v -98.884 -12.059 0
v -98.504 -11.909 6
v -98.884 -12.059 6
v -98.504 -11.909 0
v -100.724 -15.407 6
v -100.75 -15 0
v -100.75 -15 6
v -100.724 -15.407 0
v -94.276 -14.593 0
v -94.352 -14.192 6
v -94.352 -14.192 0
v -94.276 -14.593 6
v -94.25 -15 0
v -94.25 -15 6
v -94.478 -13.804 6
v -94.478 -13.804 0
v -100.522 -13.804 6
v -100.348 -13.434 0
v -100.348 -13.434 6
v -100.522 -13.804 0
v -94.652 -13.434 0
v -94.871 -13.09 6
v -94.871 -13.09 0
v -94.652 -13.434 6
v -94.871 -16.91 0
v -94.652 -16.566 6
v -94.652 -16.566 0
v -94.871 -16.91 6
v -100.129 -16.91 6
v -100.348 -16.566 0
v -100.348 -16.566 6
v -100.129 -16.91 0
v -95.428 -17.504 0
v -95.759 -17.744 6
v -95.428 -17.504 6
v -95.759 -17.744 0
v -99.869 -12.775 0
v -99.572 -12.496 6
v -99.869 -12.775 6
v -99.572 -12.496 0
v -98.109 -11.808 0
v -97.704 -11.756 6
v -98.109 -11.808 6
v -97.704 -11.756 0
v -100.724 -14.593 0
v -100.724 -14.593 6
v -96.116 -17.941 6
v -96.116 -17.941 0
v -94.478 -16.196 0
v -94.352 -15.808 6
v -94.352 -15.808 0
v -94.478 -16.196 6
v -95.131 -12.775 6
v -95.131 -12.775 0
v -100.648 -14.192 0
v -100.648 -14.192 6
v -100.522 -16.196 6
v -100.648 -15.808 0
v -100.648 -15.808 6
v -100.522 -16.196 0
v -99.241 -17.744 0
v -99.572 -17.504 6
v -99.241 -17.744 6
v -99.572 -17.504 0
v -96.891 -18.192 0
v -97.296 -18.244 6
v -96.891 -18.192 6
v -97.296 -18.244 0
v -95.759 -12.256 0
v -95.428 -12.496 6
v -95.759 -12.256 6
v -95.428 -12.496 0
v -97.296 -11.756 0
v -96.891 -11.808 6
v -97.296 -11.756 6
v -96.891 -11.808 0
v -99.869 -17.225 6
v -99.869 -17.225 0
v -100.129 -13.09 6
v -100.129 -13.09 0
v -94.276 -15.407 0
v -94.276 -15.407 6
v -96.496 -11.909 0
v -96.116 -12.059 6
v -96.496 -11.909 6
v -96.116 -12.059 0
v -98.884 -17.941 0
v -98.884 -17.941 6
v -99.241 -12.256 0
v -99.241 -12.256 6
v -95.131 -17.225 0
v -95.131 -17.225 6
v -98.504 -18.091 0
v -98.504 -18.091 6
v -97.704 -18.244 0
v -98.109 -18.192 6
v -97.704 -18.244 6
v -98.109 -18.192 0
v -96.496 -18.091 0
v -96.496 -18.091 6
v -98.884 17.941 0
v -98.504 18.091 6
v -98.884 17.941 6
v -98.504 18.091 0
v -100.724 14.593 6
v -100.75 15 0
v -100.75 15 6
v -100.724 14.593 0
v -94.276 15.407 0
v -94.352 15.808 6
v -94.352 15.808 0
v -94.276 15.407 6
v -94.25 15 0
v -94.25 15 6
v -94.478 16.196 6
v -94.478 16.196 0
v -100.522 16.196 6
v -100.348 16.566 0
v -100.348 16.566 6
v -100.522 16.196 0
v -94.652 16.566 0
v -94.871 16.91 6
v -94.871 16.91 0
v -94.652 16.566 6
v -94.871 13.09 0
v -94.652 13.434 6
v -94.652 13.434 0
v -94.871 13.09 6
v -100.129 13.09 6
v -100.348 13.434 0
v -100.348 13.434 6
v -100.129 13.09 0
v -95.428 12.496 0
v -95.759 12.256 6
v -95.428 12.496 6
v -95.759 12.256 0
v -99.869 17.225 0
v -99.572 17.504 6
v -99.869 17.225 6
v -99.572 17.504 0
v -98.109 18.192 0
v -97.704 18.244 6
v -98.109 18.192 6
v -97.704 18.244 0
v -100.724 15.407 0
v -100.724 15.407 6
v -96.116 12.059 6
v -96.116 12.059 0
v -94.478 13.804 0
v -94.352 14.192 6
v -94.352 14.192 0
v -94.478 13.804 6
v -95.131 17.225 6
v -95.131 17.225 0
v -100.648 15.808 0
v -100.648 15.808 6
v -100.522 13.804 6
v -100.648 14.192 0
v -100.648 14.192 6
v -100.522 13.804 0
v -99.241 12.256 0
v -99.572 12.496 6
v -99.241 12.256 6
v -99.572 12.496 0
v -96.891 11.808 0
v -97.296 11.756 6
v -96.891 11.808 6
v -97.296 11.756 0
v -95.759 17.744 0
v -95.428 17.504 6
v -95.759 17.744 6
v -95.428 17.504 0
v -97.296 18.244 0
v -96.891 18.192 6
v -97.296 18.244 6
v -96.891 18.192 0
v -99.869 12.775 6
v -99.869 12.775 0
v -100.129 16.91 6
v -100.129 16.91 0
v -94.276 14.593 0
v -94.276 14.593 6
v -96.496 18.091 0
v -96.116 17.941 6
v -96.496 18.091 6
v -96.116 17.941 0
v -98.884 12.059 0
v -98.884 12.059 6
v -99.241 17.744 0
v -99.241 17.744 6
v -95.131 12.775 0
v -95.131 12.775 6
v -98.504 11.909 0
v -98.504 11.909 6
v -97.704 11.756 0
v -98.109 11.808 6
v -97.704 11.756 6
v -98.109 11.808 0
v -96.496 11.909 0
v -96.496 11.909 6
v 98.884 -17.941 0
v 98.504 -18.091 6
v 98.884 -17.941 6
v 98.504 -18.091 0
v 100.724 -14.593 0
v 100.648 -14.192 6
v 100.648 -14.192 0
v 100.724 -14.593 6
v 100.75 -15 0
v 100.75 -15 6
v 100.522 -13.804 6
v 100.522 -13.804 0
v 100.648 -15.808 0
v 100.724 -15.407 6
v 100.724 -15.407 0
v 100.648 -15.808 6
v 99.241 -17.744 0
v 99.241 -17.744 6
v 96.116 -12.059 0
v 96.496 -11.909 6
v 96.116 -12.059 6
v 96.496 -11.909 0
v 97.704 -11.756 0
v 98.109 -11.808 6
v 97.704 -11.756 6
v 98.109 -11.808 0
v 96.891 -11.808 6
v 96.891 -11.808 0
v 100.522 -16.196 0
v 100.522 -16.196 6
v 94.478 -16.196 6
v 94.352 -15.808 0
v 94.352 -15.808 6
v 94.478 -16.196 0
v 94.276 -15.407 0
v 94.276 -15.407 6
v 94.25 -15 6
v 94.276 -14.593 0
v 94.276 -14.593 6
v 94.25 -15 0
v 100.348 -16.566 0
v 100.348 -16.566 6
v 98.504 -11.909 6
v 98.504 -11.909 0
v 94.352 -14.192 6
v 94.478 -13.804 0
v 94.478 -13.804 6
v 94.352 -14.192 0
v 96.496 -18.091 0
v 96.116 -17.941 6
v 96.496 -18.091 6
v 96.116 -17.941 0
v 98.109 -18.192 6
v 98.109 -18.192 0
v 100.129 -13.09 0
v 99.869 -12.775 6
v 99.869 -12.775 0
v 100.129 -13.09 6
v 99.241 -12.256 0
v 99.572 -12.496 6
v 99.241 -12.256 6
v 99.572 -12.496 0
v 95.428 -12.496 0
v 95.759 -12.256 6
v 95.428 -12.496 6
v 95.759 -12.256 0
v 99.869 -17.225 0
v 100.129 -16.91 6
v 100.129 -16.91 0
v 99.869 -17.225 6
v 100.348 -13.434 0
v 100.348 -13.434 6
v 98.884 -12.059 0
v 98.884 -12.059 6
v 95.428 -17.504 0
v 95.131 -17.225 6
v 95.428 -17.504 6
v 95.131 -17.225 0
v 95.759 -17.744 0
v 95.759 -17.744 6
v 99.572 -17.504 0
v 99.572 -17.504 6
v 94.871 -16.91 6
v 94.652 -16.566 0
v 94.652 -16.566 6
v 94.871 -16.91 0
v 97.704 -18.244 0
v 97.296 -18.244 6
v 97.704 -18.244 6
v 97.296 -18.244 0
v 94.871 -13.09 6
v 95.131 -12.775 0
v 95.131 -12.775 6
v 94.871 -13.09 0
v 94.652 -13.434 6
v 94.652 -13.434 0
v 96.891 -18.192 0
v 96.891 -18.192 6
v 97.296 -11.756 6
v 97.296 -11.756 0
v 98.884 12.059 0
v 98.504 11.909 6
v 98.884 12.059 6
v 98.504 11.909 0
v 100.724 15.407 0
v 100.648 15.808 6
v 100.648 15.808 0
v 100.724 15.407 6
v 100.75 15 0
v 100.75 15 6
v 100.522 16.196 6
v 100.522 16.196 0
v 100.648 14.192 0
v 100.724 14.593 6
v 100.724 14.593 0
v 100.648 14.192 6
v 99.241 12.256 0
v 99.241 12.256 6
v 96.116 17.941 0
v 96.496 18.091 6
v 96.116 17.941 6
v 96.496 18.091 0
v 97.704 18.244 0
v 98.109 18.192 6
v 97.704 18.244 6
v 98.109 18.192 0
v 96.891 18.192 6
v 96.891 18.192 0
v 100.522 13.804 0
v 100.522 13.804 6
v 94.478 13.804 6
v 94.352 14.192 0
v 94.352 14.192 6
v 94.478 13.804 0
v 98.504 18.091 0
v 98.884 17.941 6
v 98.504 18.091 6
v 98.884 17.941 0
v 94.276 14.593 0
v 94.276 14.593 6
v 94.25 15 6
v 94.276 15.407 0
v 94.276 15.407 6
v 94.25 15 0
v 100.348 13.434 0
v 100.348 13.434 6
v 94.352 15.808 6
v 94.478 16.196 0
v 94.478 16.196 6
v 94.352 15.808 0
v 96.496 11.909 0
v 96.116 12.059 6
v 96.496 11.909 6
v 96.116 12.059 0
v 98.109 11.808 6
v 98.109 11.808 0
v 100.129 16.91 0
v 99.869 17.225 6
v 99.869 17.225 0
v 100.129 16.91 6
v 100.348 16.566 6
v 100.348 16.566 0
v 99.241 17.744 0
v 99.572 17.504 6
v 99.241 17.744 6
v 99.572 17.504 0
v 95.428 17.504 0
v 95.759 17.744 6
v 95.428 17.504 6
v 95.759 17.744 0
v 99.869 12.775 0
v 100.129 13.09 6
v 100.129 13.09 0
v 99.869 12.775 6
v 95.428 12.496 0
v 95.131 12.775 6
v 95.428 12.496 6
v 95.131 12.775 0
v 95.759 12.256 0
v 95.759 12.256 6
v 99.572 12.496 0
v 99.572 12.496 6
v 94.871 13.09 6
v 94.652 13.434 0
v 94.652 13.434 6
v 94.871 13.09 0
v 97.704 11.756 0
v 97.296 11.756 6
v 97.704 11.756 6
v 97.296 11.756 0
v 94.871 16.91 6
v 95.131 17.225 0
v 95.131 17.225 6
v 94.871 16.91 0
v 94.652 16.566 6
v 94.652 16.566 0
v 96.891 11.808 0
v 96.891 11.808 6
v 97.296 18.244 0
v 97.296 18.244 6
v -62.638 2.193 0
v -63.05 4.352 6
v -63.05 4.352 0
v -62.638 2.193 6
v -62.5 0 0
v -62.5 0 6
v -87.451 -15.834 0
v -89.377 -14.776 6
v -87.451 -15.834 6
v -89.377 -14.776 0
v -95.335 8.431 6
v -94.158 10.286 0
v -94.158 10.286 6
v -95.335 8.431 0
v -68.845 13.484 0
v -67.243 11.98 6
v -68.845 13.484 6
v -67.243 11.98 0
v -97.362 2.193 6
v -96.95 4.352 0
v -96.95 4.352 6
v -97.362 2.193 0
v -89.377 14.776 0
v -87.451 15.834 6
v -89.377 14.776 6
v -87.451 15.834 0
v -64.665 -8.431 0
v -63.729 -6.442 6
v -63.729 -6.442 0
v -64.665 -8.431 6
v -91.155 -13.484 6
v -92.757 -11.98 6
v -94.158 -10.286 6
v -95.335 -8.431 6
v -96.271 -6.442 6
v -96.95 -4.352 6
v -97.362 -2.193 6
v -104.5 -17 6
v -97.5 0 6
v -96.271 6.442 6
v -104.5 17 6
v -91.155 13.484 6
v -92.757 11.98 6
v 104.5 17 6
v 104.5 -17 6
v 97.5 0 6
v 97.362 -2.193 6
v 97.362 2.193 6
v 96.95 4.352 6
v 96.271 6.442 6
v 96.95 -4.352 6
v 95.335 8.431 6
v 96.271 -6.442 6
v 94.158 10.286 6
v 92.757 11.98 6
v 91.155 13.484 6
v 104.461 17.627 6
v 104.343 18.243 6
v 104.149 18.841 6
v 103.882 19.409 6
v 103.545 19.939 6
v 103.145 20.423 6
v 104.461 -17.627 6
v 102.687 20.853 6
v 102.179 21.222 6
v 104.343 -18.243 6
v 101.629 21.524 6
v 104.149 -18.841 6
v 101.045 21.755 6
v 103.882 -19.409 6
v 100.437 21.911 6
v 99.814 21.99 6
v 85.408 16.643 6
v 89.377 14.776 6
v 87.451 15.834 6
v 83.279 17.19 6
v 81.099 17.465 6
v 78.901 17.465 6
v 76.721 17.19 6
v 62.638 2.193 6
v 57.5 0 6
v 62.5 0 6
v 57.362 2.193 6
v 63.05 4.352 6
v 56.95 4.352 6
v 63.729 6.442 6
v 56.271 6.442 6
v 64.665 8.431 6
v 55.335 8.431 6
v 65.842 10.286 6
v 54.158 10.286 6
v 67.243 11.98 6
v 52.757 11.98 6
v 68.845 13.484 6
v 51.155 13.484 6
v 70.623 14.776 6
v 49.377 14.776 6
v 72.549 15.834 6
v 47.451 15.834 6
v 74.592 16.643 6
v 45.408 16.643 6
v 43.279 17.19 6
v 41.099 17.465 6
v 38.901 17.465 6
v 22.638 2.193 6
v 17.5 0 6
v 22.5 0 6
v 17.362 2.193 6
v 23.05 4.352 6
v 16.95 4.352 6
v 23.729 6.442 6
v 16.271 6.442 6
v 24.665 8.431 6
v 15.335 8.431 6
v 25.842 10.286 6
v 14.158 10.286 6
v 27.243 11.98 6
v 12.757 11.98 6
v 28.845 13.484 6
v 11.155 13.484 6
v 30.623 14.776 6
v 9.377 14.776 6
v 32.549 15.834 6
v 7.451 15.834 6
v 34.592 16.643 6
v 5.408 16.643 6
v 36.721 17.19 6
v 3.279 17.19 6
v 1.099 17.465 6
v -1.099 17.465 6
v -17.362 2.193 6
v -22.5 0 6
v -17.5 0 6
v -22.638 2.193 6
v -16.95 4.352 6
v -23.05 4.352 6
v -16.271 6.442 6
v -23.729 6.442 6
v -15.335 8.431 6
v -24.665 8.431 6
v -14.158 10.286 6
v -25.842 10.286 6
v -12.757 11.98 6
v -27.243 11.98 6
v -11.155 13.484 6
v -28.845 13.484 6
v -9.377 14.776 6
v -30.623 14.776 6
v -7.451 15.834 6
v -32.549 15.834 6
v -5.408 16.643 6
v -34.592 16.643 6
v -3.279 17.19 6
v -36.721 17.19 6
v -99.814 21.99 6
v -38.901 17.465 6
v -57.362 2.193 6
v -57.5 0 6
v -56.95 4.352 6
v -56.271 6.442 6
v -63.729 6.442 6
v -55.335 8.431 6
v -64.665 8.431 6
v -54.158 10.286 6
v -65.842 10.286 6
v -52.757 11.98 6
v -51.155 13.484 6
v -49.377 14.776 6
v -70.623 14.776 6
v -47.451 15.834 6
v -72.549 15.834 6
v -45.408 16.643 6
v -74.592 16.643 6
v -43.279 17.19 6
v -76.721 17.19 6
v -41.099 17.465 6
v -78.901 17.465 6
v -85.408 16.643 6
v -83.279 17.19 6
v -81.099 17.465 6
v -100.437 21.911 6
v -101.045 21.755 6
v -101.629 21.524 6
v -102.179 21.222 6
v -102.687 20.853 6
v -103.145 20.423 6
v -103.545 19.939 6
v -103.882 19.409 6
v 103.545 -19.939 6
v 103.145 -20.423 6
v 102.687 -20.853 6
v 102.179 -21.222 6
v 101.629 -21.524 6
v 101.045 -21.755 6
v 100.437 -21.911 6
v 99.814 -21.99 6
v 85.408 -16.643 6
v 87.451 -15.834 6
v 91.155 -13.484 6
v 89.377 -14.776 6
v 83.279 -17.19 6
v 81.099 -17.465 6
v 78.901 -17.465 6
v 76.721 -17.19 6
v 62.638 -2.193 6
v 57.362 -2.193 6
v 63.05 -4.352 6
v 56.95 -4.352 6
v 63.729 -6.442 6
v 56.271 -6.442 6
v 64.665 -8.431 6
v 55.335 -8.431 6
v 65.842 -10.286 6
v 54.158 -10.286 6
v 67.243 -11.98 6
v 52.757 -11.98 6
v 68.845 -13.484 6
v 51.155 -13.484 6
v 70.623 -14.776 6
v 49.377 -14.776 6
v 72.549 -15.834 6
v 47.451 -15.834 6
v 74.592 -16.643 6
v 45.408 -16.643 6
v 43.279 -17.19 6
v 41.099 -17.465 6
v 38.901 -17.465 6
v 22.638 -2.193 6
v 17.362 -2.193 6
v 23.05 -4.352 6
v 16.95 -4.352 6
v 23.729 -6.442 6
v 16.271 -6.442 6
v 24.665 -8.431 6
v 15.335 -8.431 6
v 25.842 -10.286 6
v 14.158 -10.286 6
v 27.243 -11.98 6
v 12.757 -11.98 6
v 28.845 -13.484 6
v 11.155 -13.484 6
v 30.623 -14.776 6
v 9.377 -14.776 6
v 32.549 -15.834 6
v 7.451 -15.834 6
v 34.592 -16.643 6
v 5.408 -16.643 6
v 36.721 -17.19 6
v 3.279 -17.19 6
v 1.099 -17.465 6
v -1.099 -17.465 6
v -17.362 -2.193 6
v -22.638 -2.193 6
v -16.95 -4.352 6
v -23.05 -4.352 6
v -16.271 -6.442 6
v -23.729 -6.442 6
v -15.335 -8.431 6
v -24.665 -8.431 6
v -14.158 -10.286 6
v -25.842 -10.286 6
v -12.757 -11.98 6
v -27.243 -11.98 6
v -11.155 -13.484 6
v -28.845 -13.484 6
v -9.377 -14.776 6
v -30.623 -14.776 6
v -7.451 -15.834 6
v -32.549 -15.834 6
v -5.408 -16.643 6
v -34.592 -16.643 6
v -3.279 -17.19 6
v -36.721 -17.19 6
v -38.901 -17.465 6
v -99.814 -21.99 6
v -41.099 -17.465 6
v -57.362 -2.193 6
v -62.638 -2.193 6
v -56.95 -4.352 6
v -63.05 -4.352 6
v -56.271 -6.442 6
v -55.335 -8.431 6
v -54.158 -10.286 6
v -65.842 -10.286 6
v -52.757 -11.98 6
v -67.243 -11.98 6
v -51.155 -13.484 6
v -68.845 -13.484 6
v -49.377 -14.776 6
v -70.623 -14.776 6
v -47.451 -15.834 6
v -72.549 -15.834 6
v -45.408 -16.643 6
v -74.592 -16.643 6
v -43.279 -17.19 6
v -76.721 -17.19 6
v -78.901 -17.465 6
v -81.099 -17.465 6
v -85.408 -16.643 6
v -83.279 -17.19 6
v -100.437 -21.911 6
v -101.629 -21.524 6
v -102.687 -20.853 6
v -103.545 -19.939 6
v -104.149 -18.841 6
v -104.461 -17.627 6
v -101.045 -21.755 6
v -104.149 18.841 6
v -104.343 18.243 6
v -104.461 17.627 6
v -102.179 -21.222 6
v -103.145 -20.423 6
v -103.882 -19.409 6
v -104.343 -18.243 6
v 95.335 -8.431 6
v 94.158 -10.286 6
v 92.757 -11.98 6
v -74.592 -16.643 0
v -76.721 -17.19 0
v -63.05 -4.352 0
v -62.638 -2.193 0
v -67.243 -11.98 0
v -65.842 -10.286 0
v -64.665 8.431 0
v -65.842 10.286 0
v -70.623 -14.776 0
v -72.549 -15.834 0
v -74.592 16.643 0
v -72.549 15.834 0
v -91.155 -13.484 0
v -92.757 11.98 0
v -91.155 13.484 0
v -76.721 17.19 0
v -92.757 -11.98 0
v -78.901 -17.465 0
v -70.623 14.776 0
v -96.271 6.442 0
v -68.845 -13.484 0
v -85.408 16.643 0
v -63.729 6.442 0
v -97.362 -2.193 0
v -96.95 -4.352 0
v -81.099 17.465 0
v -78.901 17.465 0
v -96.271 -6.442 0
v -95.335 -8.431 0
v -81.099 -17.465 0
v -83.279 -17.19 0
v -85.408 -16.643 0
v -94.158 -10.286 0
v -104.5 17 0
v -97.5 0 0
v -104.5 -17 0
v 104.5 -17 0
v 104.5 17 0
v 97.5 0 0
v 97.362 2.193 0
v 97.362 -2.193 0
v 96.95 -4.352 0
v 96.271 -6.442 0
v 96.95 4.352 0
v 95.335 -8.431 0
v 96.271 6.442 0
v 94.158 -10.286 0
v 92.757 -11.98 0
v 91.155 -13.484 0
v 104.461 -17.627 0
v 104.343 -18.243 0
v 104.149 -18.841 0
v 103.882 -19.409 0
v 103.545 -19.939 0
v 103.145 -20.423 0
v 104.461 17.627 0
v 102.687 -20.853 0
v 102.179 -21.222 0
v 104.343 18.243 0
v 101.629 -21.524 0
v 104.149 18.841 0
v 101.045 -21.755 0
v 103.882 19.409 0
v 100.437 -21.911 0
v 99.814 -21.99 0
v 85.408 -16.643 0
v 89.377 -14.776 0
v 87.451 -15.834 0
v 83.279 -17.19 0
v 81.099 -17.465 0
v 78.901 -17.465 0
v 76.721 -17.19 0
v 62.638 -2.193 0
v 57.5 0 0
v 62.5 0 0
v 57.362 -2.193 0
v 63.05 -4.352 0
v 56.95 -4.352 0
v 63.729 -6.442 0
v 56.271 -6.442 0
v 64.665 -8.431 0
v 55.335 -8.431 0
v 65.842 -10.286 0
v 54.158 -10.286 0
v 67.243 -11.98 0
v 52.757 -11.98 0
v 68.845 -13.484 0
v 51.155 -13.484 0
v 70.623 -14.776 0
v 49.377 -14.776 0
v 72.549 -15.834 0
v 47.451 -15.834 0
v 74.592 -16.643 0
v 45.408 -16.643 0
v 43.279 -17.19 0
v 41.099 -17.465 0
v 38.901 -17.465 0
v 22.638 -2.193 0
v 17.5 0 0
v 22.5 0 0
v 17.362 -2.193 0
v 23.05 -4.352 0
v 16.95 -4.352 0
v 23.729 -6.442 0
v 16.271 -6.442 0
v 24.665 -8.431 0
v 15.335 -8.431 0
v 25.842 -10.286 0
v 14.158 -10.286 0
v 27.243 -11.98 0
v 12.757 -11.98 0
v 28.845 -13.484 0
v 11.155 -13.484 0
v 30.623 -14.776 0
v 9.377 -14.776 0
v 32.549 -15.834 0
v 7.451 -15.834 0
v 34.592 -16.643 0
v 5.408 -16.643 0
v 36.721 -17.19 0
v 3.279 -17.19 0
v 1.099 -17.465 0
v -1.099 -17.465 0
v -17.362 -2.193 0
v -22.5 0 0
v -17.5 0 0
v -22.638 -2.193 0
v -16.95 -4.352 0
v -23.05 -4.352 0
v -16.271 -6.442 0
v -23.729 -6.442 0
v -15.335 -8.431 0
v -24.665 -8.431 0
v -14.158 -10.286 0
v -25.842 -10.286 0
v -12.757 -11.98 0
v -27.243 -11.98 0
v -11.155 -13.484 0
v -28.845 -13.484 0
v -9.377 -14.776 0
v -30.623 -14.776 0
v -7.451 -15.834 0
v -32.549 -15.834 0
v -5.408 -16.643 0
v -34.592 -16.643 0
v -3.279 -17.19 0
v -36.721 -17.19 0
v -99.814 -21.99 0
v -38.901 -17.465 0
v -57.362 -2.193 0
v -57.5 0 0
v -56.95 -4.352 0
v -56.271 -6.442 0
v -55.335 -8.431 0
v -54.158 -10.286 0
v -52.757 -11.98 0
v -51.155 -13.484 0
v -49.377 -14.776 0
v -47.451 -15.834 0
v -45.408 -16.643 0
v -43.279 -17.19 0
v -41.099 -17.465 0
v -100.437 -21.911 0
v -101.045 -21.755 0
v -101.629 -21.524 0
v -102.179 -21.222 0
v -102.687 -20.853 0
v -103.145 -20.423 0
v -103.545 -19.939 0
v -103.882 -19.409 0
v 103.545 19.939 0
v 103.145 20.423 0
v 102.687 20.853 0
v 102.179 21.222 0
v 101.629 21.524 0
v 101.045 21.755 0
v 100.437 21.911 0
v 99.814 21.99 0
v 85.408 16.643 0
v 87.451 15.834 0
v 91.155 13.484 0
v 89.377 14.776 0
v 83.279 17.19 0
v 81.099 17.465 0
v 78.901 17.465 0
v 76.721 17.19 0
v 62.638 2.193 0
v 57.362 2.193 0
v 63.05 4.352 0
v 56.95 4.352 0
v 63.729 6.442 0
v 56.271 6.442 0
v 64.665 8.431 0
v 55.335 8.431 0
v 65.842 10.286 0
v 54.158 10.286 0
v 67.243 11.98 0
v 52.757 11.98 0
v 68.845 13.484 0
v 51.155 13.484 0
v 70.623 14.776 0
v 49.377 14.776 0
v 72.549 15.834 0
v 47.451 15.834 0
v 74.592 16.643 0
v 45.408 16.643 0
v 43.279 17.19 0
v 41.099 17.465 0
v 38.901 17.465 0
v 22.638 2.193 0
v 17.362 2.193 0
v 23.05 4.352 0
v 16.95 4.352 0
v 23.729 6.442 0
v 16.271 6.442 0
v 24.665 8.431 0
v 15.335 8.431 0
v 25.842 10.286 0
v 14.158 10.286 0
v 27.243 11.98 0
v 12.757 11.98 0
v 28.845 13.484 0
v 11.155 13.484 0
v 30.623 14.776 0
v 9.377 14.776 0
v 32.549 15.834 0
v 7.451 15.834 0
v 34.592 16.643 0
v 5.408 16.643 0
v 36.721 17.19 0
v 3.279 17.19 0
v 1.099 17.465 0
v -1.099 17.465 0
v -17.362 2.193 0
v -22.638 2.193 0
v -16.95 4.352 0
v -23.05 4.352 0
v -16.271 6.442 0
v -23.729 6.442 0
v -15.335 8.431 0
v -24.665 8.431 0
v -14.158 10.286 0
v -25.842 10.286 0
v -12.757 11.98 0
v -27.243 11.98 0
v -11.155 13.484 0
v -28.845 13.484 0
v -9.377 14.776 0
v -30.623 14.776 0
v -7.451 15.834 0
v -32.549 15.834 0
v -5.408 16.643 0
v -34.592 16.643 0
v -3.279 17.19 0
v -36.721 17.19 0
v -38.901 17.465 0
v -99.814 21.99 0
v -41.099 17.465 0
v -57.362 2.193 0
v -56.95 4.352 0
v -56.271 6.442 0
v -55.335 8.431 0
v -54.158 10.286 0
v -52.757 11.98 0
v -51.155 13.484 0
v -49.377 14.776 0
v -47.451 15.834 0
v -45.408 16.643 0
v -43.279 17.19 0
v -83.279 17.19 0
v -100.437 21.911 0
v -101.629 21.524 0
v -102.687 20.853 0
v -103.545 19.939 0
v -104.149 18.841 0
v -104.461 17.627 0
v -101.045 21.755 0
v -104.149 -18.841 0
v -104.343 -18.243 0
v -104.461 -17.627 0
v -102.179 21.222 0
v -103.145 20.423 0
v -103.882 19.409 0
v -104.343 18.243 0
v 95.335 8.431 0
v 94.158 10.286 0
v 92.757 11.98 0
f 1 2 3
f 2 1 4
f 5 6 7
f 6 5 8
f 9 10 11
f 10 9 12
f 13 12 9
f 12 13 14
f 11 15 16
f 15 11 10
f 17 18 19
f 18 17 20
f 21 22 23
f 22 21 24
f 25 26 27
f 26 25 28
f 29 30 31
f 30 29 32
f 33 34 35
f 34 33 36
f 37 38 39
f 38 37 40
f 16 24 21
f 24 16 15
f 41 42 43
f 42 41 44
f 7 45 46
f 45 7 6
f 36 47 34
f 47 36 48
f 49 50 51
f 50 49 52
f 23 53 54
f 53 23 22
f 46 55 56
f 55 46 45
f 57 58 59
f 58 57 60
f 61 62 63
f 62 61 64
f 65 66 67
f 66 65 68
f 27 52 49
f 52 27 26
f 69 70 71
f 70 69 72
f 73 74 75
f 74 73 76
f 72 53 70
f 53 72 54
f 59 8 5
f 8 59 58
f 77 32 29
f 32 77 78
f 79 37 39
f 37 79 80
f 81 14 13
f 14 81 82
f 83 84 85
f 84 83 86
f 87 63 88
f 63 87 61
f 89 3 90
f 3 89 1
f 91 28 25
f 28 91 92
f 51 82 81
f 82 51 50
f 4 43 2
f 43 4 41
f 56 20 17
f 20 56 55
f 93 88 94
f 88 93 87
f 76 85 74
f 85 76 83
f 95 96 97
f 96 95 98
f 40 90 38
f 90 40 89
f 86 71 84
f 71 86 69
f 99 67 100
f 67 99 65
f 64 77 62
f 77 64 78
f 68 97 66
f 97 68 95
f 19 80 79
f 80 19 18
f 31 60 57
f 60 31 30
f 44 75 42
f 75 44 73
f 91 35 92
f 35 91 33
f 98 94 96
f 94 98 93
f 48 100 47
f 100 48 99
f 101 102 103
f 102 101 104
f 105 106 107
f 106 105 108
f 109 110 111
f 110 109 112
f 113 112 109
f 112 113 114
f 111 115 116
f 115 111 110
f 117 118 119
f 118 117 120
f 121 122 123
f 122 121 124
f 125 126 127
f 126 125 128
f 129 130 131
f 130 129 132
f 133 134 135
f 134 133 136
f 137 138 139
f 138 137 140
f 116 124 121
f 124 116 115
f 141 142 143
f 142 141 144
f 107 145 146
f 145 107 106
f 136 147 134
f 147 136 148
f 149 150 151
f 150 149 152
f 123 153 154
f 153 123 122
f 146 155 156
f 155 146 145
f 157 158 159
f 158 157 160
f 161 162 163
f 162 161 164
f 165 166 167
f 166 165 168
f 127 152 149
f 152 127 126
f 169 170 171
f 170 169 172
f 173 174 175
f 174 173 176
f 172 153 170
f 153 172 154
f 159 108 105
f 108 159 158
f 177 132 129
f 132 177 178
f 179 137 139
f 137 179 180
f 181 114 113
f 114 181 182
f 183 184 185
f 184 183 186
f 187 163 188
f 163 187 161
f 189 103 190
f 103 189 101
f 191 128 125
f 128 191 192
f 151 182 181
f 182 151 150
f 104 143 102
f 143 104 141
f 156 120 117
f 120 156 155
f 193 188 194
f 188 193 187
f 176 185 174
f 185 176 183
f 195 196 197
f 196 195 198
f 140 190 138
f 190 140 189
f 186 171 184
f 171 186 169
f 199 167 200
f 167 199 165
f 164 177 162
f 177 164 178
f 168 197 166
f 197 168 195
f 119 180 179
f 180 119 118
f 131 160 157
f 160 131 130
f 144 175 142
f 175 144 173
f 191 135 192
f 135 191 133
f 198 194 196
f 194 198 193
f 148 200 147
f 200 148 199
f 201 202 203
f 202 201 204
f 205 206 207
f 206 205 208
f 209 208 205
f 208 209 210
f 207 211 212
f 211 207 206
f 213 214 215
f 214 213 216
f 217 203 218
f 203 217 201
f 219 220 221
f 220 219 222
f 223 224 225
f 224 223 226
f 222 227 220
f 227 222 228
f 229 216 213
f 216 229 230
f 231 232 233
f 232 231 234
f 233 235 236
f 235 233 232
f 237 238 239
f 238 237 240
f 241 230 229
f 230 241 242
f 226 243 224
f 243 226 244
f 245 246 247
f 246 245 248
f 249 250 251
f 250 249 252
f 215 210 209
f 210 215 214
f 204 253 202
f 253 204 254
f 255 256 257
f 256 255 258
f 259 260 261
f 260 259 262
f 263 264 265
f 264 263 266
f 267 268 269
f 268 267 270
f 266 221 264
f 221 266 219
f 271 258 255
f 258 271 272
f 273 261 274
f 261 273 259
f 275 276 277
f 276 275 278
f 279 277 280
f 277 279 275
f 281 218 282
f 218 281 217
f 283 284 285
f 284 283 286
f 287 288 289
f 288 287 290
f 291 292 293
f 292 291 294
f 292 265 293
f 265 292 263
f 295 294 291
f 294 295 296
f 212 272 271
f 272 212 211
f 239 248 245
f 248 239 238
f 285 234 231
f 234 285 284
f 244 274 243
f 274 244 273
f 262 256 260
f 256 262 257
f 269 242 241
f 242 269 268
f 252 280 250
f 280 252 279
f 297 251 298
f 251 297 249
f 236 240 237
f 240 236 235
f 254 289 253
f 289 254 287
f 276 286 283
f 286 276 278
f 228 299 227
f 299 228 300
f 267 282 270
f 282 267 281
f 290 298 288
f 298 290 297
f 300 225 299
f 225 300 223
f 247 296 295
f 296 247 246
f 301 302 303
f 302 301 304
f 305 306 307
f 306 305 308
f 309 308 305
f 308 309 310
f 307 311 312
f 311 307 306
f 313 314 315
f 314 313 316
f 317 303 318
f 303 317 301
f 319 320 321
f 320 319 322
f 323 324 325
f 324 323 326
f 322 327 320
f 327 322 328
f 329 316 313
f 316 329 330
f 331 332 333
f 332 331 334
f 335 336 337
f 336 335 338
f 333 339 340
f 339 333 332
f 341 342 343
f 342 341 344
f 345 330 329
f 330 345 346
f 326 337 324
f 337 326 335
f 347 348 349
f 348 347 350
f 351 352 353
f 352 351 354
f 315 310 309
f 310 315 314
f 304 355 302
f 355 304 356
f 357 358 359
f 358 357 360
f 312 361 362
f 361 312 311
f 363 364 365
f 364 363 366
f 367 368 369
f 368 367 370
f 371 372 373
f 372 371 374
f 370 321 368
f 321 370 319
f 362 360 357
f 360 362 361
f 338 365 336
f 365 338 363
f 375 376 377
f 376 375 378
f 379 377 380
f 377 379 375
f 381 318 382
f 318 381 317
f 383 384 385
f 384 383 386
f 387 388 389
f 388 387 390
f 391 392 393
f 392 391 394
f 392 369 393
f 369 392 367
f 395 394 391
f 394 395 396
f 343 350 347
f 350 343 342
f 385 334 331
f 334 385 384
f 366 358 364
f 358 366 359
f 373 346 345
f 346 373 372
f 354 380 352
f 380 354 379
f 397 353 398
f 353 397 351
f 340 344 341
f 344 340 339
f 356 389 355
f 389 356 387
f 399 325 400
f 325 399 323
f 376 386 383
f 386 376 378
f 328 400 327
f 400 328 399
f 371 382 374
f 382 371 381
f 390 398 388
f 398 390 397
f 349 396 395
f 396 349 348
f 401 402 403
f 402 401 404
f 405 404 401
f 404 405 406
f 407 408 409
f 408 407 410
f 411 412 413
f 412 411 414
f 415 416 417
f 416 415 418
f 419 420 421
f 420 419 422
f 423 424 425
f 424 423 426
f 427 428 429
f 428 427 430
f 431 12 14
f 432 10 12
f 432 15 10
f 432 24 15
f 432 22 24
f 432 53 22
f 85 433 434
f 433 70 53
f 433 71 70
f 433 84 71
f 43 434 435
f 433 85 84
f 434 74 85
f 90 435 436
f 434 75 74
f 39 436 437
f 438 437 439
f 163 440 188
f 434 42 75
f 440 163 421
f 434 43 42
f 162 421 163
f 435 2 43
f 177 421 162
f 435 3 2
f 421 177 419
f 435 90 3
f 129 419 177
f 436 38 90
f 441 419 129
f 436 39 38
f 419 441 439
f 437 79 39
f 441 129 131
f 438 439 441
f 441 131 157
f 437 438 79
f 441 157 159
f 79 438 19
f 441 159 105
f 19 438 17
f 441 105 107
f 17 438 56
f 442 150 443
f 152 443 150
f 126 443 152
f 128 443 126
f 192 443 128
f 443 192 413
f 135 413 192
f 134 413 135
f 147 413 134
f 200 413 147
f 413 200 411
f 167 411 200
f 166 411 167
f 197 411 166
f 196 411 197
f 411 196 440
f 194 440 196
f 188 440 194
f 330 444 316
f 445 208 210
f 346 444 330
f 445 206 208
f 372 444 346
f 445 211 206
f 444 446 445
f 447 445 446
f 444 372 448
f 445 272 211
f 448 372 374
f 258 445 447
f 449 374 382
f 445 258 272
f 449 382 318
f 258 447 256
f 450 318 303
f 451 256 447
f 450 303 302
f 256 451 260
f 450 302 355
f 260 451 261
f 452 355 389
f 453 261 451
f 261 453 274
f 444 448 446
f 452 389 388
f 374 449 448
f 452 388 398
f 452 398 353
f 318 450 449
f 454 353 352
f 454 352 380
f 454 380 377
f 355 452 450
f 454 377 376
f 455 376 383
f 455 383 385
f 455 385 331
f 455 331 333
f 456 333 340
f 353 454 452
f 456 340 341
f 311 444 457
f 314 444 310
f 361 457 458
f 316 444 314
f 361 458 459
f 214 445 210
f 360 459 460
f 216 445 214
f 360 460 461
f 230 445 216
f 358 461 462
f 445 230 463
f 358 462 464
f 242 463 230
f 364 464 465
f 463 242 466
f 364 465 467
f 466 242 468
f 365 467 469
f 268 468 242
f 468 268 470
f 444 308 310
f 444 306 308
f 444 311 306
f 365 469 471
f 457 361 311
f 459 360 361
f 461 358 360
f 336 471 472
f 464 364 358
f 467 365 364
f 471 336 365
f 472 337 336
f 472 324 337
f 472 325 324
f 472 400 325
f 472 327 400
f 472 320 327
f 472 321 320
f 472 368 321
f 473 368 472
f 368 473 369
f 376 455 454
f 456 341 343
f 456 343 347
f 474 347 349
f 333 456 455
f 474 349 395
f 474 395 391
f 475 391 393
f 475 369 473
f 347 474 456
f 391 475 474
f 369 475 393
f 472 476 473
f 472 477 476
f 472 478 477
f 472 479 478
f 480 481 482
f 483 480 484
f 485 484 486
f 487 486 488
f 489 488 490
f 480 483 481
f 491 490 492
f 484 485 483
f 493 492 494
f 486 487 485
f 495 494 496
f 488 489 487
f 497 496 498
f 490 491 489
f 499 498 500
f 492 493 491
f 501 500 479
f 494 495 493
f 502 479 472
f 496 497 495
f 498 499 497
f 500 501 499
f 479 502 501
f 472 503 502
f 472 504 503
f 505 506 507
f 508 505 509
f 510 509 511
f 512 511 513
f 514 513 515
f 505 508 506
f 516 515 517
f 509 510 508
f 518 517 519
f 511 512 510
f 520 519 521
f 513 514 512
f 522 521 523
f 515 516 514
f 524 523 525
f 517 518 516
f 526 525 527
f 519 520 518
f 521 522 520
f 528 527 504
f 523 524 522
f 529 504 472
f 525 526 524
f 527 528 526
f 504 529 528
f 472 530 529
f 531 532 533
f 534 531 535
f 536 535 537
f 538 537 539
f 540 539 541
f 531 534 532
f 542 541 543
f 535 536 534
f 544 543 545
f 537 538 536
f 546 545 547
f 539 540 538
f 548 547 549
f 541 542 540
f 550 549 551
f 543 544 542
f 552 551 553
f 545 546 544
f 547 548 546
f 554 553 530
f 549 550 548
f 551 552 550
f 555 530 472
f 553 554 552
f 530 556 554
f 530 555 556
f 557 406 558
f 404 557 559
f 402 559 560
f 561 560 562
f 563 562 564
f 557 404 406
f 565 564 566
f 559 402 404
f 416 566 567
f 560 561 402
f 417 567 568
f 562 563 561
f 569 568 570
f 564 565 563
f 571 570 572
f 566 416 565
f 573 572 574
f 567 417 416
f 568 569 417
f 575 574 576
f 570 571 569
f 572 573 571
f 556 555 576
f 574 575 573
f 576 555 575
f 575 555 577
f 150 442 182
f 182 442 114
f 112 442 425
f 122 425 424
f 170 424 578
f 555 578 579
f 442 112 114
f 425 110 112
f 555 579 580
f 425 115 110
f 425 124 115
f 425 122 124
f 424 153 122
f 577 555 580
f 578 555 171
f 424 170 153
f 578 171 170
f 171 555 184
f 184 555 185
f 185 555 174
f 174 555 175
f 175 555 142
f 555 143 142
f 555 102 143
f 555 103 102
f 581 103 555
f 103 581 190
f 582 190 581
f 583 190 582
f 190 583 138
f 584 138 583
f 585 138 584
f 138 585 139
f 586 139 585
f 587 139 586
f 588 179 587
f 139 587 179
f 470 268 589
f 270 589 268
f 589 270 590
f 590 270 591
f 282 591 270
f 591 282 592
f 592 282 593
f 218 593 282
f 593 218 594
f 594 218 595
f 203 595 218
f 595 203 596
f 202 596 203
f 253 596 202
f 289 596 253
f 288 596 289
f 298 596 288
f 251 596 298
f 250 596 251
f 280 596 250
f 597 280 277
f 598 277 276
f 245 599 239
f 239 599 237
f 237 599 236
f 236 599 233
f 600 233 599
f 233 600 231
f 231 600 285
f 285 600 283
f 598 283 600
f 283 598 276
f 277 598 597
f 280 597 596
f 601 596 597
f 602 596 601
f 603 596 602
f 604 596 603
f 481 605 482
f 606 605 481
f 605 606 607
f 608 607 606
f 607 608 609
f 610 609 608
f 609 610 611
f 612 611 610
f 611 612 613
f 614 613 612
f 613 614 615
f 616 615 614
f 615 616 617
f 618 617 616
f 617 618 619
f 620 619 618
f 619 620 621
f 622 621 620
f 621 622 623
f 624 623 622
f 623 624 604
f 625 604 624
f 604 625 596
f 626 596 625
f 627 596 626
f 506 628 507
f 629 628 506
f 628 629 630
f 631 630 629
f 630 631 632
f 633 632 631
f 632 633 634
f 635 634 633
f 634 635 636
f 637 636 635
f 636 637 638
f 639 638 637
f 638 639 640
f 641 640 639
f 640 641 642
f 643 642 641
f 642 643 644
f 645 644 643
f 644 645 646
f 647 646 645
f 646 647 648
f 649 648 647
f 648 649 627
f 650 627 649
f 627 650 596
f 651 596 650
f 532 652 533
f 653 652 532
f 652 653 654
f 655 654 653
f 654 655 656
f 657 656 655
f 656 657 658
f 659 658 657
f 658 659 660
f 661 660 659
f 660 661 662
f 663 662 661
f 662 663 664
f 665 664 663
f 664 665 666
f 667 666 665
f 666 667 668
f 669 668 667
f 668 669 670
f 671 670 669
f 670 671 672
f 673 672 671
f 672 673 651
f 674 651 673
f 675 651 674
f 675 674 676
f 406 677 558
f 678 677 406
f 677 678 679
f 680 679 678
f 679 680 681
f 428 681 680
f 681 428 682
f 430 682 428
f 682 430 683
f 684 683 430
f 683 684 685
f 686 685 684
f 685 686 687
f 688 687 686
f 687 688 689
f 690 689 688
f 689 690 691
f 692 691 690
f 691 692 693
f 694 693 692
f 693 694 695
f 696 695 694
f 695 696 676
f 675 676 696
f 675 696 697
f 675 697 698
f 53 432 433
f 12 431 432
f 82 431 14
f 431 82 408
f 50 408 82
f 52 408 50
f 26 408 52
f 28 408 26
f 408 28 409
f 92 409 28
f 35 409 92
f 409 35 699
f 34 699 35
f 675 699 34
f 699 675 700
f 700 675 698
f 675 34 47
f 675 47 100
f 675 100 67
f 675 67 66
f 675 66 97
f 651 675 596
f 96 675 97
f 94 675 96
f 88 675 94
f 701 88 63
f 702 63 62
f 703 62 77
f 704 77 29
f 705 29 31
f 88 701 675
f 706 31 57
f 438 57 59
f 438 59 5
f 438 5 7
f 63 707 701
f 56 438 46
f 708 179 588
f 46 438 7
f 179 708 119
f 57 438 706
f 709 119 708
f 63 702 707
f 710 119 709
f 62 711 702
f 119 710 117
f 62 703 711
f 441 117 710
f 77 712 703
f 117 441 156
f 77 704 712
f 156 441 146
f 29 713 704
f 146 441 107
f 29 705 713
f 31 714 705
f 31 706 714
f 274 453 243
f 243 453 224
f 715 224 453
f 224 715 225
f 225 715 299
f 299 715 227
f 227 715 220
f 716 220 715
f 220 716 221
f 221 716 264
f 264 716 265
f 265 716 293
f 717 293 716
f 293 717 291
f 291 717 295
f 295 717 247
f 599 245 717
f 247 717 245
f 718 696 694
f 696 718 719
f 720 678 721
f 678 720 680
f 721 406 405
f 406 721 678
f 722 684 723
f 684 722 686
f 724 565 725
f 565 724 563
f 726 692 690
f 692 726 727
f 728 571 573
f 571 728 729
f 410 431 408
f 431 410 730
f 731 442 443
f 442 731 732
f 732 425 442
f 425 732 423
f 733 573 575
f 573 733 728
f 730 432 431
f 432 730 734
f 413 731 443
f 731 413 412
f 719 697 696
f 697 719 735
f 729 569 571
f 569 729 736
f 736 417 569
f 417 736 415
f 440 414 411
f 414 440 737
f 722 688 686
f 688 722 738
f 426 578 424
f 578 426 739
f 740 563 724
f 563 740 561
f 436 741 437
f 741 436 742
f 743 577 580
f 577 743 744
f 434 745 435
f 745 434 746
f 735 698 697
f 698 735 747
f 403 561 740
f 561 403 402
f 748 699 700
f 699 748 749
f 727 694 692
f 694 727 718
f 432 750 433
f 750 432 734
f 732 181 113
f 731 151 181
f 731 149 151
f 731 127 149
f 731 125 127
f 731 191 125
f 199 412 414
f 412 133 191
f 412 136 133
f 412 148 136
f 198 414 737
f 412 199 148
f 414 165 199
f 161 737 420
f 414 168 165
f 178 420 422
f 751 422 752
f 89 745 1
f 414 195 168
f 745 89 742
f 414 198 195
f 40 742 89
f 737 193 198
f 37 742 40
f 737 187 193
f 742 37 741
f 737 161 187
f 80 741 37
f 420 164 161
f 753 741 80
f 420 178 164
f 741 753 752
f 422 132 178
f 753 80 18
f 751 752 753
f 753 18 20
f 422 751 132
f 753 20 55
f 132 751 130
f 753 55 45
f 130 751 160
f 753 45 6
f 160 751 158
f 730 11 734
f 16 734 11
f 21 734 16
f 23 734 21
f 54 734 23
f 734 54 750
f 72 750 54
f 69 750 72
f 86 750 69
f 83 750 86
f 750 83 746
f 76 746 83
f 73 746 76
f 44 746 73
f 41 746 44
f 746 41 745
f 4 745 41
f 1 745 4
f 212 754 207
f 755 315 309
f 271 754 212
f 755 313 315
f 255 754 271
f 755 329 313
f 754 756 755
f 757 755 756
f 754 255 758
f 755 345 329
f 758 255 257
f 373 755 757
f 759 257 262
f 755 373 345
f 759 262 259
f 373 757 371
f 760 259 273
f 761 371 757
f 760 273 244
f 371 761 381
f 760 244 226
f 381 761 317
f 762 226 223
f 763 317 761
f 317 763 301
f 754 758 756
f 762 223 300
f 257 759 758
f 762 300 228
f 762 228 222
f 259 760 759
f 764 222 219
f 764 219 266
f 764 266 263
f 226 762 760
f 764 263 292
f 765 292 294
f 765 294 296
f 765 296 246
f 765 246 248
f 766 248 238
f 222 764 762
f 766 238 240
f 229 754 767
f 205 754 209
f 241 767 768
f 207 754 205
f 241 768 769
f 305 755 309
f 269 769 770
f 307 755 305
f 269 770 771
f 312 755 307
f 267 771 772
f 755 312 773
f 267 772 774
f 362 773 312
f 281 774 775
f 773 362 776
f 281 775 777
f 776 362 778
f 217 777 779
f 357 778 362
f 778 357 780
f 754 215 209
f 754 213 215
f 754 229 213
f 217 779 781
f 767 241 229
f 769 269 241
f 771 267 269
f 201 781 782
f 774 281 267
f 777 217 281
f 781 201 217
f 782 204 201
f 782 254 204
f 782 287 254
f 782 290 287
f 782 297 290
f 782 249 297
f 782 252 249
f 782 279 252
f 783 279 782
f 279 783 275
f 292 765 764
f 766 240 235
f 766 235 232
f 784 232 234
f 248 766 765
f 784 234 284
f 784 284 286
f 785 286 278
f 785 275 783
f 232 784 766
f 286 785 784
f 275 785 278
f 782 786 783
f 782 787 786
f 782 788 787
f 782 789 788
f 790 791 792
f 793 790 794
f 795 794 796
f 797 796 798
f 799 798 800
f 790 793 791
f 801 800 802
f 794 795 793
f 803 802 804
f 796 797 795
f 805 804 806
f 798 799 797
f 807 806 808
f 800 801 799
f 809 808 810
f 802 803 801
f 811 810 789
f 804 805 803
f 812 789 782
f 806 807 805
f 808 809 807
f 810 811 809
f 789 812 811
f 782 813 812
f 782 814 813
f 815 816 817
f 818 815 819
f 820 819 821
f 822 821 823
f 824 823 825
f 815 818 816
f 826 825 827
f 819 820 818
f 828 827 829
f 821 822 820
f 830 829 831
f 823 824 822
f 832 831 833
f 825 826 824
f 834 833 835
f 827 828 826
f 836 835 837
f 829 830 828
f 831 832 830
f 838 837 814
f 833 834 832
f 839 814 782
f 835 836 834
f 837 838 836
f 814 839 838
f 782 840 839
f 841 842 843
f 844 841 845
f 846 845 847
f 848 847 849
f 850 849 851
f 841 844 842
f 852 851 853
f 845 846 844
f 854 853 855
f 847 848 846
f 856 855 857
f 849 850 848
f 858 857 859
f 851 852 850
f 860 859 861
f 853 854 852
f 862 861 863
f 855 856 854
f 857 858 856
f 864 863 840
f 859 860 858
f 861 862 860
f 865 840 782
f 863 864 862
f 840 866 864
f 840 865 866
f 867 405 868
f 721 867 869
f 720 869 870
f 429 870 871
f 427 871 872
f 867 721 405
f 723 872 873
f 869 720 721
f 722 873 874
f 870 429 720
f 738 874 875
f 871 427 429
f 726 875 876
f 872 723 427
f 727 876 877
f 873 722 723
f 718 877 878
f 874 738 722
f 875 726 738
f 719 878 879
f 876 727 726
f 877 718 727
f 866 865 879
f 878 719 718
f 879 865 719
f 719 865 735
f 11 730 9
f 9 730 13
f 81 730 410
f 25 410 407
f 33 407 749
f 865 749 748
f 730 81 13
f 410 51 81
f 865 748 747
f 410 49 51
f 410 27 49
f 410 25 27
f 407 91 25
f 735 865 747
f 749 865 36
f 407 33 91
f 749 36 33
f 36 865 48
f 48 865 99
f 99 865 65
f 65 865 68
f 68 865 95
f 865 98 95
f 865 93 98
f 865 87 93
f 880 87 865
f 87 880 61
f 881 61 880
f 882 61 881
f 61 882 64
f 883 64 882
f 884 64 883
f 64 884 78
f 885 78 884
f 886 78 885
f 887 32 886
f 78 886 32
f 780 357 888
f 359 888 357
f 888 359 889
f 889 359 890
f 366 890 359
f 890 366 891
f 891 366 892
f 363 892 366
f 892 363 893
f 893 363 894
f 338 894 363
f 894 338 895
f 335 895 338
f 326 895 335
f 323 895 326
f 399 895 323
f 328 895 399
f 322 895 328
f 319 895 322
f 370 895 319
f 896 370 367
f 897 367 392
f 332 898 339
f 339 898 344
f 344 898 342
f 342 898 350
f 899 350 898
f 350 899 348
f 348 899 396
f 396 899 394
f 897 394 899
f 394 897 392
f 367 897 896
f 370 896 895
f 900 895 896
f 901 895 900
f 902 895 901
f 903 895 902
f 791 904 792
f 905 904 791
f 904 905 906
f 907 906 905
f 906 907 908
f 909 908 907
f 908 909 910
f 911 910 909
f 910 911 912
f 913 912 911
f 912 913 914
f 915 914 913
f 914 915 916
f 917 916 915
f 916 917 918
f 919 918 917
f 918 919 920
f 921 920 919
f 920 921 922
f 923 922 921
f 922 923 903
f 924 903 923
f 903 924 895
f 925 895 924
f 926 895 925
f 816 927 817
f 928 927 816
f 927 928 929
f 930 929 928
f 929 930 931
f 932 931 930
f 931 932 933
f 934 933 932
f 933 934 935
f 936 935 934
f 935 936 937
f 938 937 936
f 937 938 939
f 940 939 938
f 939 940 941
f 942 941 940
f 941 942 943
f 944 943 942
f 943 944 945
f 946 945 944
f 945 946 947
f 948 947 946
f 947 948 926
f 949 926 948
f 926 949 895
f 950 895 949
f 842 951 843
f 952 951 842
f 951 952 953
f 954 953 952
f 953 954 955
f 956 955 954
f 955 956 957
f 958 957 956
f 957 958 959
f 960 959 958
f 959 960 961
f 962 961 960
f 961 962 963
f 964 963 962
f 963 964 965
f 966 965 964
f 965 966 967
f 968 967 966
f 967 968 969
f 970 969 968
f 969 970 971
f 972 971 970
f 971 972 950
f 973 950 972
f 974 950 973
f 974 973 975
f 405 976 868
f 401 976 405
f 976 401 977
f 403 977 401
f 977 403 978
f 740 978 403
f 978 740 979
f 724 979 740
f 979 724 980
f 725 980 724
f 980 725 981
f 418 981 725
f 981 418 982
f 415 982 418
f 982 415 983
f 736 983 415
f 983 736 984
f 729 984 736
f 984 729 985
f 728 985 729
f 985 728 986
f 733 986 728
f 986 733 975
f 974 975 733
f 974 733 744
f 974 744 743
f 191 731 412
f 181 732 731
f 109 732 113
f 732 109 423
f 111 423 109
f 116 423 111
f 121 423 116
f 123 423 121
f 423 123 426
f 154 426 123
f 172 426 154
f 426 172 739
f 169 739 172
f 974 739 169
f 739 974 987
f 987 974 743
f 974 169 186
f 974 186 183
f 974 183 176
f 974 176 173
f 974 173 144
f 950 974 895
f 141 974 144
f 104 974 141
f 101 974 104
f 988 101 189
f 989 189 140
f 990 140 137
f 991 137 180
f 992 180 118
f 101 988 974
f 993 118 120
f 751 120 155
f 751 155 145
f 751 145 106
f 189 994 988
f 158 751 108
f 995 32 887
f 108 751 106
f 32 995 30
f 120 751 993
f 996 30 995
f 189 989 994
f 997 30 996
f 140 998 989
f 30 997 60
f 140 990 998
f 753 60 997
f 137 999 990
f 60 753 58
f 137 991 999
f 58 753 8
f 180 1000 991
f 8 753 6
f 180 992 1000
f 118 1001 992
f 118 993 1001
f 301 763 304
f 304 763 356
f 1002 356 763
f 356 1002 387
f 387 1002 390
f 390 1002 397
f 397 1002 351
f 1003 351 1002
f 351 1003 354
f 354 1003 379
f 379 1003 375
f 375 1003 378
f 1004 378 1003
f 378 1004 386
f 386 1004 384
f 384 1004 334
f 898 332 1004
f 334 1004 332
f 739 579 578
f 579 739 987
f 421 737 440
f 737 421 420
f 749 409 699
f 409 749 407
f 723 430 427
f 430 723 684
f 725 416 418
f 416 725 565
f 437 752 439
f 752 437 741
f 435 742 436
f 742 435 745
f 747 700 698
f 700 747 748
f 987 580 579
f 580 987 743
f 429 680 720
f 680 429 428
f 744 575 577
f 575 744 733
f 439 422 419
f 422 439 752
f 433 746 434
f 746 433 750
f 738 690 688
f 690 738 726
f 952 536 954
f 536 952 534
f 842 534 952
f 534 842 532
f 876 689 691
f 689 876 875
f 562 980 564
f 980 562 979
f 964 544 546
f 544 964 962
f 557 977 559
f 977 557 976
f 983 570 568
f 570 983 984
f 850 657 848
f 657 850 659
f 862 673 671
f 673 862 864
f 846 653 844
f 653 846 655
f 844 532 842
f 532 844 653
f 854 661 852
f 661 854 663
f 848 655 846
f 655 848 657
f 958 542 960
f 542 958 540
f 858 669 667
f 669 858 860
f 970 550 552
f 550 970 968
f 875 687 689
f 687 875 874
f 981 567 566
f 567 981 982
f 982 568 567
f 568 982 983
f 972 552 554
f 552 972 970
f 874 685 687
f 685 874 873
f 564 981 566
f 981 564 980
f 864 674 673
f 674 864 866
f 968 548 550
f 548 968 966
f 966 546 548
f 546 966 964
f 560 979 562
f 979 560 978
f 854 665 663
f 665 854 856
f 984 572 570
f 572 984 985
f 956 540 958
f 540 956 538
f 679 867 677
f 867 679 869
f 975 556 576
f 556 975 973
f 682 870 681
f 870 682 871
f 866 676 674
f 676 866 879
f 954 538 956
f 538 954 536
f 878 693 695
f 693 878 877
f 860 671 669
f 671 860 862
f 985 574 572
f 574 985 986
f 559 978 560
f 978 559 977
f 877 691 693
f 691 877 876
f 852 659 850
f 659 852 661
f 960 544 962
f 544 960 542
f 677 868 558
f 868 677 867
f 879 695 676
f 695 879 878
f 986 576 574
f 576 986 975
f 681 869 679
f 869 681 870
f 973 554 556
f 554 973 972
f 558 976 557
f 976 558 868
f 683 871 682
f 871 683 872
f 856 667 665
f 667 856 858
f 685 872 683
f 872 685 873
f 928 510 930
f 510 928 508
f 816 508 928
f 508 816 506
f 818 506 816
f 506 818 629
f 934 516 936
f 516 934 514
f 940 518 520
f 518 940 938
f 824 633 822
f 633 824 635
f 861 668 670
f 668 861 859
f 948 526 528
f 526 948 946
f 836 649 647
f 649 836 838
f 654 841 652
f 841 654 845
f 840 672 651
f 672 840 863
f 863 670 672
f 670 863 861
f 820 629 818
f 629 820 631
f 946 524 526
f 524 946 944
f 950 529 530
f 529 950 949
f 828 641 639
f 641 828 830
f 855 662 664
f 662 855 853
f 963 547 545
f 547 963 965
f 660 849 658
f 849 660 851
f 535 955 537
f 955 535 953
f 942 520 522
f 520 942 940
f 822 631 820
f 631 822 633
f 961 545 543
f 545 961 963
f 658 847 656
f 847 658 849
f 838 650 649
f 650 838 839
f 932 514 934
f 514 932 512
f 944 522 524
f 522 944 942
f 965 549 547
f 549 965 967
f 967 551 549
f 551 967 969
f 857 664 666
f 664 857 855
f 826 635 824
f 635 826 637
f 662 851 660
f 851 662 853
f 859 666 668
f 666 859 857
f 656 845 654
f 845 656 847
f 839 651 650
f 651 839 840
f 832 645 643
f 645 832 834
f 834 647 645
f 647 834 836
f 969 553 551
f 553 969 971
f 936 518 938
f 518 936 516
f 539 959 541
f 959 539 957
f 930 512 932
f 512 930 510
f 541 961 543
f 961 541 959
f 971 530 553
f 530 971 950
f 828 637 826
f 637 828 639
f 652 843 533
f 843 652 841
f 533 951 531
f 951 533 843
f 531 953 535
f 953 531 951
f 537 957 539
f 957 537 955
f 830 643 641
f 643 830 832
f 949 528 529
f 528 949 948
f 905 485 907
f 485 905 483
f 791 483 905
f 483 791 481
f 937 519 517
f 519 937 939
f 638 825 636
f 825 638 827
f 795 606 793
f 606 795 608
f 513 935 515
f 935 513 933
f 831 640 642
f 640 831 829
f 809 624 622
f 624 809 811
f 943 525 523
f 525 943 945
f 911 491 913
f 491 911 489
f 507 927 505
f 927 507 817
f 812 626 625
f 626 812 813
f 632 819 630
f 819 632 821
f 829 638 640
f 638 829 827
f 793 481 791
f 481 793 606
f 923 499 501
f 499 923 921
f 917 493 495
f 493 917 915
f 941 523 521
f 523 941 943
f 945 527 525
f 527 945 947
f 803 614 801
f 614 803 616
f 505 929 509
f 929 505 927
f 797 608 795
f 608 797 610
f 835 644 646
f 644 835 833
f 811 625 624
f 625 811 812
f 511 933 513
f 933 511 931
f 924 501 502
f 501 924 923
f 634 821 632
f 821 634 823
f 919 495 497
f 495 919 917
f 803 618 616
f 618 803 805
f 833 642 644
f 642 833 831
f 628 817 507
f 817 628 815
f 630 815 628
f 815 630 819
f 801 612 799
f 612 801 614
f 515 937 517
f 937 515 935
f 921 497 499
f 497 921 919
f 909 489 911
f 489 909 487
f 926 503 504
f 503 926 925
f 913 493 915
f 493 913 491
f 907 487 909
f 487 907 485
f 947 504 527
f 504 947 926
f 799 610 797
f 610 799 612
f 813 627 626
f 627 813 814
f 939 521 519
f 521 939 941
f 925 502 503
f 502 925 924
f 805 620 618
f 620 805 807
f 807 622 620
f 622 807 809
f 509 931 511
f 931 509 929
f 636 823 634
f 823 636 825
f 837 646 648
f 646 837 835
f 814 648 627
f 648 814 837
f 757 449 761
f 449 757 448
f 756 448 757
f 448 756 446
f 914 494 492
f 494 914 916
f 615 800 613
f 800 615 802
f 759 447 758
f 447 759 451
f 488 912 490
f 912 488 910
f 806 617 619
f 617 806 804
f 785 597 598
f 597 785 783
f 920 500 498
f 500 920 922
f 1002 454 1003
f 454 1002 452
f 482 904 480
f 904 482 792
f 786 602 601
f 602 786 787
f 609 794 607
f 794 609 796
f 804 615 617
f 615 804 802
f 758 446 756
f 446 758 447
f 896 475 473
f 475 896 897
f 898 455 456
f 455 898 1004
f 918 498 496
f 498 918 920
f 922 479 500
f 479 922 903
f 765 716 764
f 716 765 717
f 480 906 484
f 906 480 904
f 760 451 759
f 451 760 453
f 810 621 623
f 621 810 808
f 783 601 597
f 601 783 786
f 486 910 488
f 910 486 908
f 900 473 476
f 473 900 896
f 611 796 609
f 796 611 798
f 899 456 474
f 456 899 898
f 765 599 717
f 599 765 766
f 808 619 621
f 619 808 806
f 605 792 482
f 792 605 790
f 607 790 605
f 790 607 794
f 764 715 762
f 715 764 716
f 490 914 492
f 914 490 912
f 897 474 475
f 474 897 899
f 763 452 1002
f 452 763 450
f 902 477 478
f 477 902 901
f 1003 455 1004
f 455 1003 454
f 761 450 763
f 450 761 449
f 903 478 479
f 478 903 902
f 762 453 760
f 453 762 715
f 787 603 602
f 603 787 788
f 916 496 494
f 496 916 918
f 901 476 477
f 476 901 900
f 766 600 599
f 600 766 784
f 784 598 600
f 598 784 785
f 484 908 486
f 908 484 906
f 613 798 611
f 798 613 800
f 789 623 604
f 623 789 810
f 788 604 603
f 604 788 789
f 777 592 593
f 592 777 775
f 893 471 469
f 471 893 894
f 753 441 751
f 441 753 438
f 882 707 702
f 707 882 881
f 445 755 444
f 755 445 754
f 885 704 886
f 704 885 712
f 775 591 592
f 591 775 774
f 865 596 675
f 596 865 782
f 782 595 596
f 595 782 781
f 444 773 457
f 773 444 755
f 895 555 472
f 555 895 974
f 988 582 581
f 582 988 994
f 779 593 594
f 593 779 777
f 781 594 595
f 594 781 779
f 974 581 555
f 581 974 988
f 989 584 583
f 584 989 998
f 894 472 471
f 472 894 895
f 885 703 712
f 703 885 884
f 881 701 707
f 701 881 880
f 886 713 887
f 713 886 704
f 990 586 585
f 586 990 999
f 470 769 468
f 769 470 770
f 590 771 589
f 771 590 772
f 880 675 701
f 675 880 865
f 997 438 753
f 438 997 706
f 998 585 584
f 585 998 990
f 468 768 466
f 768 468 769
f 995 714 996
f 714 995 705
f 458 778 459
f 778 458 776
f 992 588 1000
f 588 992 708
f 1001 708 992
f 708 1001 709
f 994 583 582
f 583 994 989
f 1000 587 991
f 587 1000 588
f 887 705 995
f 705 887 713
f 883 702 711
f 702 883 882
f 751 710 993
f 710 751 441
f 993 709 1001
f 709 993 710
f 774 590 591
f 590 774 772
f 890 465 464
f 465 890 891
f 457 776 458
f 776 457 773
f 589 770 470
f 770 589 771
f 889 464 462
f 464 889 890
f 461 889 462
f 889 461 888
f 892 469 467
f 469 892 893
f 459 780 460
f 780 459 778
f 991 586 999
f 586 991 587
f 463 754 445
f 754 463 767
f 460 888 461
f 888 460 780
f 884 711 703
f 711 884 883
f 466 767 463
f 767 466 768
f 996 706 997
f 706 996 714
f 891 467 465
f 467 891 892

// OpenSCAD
$fn = 50;


difference() {
	union() {
		hull() {
			translate(v = [-99.5000000000, 17.0000000000, 0]) {
				cylinder(h = 6, r = 5);
			}
			translate(v = [99.5000000000, 17.0000000000, 0]) {
				cylinder(h = 6, r = 5);
			}
			translate(v = [-99.5000000000, -17.0000000000, 0]) {
				cylinder(h = 6, r = 5);
			}
			translate(v = [99.5000000000, -17.0000000000, 0]) {
				cylinder(h = 6, r = 5);
			}
		}
	}
	union() {
		#translate(v = [-97.5000000000, -15.0000000000, -100.0000000000]) {
			cylinder(h = 200, r = 3.2500000000);
		}
		#translate(v = [-97.5000000000, 15.0000000000, -100.0000000000]) {
			cylinder(h = 200, r = 3.2500000000);
		}
		#translate(v = [97.5000000000, -15.0000000000, -100.0000000000]) {
			cylinder(h = 200, r = 3.2500000000);
		}
		#translate(v = [97.5000000000, 15.0000000000, -100.0000000000]) {
			cylinder(h = 200, r = 3.2500000000);
		}
		#translate(v = [-80.0000000000, 0, 0]) {
			cylinder(h = 6, r = 17.5000000000);
		}
		#translate(v = [-40.0000000000, 0, 0]) {
			cylinder(h = 6, r = 17.5000000000);
		}
		#cylinder(h = 6, r = 17.5000000000);
		#translate(v = [40.0000000000, 0, 0]) {
			cylinder(h = 6, r = 17.5000000000);
		}
		#translate(v = [80.0000000000, 0, 0]) {
			cylinder(h = 6, r = 17.5000000000);
		}
	}
}
